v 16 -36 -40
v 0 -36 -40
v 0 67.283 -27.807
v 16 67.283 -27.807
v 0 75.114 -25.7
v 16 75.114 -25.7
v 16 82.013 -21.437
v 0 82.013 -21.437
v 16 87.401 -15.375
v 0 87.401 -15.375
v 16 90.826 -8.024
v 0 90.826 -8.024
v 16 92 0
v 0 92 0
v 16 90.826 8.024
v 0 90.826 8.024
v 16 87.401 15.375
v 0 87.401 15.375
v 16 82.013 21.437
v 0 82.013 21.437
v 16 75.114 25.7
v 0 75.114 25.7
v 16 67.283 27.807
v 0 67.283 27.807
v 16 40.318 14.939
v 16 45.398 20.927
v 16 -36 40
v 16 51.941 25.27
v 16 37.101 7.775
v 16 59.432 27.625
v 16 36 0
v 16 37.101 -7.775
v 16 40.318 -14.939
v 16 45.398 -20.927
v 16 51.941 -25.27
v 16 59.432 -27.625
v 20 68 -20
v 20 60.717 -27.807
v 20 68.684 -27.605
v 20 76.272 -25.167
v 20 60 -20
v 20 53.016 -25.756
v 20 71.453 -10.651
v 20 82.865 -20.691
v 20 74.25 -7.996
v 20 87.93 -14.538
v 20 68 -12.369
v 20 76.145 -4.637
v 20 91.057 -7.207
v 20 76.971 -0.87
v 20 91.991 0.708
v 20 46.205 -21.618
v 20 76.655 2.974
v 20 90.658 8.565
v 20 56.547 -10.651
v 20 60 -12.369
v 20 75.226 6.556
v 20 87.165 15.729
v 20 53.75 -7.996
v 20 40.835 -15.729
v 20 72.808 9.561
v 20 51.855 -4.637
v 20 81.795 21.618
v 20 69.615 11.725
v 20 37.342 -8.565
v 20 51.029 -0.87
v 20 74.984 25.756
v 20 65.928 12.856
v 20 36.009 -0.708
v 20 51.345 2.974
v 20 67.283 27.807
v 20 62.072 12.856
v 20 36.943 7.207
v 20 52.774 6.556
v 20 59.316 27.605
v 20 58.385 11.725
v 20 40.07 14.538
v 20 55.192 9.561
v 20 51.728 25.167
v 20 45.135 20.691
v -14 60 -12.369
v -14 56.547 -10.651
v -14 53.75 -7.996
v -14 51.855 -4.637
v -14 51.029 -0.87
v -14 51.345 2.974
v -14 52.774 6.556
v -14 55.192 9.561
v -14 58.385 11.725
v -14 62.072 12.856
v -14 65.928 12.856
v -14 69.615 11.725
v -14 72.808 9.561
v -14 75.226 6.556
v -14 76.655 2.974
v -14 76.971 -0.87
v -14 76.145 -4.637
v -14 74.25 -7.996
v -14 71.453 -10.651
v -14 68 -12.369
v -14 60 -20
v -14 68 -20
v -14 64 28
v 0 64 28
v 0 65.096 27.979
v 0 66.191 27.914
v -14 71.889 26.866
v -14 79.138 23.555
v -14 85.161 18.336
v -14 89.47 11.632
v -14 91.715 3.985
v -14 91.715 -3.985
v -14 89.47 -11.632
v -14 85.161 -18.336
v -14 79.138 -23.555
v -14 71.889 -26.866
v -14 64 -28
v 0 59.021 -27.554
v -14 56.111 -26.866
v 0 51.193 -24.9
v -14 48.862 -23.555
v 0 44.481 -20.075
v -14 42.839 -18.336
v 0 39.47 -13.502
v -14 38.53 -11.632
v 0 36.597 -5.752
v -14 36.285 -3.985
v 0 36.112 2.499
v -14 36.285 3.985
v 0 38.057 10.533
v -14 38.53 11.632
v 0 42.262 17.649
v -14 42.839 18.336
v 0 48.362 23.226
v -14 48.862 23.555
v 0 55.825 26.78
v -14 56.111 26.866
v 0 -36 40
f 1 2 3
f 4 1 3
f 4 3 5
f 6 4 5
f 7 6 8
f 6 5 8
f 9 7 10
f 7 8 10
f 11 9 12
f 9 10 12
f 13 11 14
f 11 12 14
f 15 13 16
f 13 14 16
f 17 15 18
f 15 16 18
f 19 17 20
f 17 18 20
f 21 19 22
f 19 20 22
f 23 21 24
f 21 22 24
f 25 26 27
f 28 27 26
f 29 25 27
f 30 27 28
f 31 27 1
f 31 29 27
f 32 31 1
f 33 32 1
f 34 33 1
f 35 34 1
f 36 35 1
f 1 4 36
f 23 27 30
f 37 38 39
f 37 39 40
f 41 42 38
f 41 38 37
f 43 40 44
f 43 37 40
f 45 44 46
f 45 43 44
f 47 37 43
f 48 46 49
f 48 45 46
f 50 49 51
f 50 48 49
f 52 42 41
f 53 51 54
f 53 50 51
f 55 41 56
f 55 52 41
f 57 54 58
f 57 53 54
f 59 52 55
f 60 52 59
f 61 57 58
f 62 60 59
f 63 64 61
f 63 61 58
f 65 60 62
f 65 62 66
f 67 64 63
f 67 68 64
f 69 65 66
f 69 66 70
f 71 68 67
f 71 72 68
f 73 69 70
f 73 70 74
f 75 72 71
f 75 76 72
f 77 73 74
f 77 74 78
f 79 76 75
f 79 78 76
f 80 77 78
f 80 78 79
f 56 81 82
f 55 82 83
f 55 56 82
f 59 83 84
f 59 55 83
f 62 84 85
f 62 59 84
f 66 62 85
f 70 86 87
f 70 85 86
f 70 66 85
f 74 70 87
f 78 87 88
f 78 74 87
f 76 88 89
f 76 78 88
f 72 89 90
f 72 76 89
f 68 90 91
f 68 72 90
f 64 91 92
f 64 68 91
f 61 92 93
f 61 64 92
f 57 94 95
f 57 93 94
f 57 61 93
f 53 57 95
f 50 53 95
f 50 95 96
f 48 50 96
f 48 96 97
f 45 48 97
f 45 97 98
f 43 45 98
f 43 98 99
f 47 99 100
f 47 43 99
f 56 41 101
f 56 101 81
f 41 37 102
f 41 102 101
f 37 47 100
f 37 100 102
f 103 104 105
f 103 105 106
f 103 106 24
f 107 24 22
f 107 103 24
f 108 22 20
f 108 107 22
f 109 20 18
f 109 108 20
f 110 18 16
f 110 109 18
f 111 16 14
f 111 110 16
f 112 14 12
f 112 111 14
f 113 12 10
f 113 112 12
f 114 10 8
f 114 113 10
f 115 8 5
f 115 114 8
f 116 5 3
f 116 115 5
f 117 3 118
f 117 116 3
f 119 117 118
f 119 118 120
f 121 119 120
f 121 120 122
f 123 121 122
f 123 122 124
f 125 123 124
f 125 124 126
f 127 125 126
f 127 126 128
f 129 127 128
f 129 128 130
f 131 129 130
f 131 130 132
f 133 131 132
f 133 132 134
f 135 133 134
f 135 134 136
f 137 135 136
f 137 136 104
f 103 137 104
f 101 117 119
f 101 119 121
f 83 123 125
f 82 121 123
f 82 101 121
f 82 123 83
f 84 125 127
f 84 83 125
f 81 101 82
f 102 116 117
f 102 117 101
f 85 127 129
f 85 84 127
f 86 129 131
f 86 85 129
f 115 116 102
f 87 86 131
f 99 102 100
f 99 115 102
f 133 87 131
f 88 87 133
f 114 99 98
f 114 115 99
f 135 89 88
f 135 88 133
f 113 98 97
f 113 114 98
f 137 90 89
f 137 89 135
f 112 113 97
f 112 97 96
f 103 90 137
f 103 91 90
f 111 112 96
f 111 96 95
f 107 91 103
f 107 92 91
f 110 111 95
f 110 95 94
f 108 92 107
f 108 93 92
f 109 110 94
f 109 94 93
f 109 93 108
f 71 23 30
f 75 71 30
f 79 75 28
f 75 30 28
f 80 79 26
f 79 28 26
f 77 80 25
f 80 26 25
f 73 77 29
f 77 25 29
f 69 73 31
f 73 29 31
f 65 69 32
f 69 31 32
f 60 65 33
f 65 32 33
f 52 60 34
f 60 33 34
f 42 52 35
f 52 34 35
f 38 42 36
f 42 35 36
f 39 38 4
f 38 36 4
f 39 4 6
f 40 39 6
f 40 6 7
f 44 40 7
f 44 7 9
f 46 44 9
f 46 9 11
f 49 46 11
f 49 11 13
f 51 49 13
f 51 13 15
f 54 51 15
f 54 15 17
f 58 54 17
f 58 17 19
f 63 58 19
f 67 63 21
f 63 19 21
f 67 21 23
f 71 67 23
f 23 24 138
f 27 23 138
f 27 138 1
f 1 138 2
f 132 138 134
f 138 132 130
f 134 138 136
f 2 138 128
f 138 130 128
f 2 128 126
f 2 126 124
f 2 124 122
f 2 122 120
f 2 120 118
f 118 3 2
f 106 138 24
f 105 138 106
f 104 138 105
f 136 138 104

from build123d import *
from build123d.topology import SkipClean

# Parameters (mm, degrees)
SALIENTE_EXTRUIR3_DEPTH = 16
CROQUIS6_R              = 28
SALIENTE_EXTRUIR4_DEPTH = 4
SALIENTE_EXTRUIR5_START = 14
CROQUIS7_R              = 28
SALIENTE_EXTRUIR5_DEPTH = 14
CORTAR_EXTRUIR1_DEPTH   = 106.924501415


with BuildPart() as part:
    # Croquis5 → Saliente-Extruir3 (new body)
    with BuildSketch(Plane(origin=(0, 0, 0), x_dir=(0, 0, -1), z_dir=(1, 0, 0))):
        with BuildLine():
            Line((40, -36), (27.806896216, 67.282758707))
            ThreePointArc((27.806896216, 67.282758707), (-4.12e-07, 92), (-27.806896887, 67.282758534))
            Line((-27.806896887, 67.282758534), (-40, -36))
            Line((-40, -36), (40, -36))
        make_face()
    extrude(amount=SALIENTE_EXTRUIR3_DEPTH)

    # Croquis6 → Saliente-Extruir4 (add)
    with BuildSketch(Plane(origin=(16, 0, 0), x_dir=(0, 0, -1), z_dir=(1, 0, 0))):
        with Locations(Location((-3.25e-07, 64, 0), (0, 0, 173.267078851))):
            Circle(CROQUIS6_R)
    extrude(amount=SALIENTE_EXTRUIR4_DEPTH)

    # Croquis7 → Saliente-Extruir5 (add)
    with SkipClean():  # the faces are left unmerged after this step: merging them gives an invalid solid
        with BuildSketch(Plane.ZY.offset(SALIENTE_EXTRUIR5_START)):
            with Locations((3.25e-07, 64)):
                Circle(CROQUIS7_R)
        extrude(amount=-SALIENTE_EXTRUIR5_DEPTH)

    # Croquis8 → Cortar-Extruir1 (cut, through all)
    with SkipClean():  # the faces are left unmerged after this step: merging them gives an invalid solid
        with BuildSketch(Plane(origin=(20, 0, 0), x_dir=(0, 0, -1), z_dir=(1, 0, 0))):
            with BuildLine():
                Line((19.999999675, 68), (19.999999675, 60))
                Line((19.999999675, 60), (12.369316552, 60))
                ThreePointArc((12.369316552, 60), (-13.000000325, 64), (12.369316552, 68))
                Line((12.369316552, 68), (19.999999675, 68))
            make_face()
        extrude(amount=-CORTAR_EXTRUIR1_DEPTH, mode=Mode.SUBTRACT)


solid = part.part
